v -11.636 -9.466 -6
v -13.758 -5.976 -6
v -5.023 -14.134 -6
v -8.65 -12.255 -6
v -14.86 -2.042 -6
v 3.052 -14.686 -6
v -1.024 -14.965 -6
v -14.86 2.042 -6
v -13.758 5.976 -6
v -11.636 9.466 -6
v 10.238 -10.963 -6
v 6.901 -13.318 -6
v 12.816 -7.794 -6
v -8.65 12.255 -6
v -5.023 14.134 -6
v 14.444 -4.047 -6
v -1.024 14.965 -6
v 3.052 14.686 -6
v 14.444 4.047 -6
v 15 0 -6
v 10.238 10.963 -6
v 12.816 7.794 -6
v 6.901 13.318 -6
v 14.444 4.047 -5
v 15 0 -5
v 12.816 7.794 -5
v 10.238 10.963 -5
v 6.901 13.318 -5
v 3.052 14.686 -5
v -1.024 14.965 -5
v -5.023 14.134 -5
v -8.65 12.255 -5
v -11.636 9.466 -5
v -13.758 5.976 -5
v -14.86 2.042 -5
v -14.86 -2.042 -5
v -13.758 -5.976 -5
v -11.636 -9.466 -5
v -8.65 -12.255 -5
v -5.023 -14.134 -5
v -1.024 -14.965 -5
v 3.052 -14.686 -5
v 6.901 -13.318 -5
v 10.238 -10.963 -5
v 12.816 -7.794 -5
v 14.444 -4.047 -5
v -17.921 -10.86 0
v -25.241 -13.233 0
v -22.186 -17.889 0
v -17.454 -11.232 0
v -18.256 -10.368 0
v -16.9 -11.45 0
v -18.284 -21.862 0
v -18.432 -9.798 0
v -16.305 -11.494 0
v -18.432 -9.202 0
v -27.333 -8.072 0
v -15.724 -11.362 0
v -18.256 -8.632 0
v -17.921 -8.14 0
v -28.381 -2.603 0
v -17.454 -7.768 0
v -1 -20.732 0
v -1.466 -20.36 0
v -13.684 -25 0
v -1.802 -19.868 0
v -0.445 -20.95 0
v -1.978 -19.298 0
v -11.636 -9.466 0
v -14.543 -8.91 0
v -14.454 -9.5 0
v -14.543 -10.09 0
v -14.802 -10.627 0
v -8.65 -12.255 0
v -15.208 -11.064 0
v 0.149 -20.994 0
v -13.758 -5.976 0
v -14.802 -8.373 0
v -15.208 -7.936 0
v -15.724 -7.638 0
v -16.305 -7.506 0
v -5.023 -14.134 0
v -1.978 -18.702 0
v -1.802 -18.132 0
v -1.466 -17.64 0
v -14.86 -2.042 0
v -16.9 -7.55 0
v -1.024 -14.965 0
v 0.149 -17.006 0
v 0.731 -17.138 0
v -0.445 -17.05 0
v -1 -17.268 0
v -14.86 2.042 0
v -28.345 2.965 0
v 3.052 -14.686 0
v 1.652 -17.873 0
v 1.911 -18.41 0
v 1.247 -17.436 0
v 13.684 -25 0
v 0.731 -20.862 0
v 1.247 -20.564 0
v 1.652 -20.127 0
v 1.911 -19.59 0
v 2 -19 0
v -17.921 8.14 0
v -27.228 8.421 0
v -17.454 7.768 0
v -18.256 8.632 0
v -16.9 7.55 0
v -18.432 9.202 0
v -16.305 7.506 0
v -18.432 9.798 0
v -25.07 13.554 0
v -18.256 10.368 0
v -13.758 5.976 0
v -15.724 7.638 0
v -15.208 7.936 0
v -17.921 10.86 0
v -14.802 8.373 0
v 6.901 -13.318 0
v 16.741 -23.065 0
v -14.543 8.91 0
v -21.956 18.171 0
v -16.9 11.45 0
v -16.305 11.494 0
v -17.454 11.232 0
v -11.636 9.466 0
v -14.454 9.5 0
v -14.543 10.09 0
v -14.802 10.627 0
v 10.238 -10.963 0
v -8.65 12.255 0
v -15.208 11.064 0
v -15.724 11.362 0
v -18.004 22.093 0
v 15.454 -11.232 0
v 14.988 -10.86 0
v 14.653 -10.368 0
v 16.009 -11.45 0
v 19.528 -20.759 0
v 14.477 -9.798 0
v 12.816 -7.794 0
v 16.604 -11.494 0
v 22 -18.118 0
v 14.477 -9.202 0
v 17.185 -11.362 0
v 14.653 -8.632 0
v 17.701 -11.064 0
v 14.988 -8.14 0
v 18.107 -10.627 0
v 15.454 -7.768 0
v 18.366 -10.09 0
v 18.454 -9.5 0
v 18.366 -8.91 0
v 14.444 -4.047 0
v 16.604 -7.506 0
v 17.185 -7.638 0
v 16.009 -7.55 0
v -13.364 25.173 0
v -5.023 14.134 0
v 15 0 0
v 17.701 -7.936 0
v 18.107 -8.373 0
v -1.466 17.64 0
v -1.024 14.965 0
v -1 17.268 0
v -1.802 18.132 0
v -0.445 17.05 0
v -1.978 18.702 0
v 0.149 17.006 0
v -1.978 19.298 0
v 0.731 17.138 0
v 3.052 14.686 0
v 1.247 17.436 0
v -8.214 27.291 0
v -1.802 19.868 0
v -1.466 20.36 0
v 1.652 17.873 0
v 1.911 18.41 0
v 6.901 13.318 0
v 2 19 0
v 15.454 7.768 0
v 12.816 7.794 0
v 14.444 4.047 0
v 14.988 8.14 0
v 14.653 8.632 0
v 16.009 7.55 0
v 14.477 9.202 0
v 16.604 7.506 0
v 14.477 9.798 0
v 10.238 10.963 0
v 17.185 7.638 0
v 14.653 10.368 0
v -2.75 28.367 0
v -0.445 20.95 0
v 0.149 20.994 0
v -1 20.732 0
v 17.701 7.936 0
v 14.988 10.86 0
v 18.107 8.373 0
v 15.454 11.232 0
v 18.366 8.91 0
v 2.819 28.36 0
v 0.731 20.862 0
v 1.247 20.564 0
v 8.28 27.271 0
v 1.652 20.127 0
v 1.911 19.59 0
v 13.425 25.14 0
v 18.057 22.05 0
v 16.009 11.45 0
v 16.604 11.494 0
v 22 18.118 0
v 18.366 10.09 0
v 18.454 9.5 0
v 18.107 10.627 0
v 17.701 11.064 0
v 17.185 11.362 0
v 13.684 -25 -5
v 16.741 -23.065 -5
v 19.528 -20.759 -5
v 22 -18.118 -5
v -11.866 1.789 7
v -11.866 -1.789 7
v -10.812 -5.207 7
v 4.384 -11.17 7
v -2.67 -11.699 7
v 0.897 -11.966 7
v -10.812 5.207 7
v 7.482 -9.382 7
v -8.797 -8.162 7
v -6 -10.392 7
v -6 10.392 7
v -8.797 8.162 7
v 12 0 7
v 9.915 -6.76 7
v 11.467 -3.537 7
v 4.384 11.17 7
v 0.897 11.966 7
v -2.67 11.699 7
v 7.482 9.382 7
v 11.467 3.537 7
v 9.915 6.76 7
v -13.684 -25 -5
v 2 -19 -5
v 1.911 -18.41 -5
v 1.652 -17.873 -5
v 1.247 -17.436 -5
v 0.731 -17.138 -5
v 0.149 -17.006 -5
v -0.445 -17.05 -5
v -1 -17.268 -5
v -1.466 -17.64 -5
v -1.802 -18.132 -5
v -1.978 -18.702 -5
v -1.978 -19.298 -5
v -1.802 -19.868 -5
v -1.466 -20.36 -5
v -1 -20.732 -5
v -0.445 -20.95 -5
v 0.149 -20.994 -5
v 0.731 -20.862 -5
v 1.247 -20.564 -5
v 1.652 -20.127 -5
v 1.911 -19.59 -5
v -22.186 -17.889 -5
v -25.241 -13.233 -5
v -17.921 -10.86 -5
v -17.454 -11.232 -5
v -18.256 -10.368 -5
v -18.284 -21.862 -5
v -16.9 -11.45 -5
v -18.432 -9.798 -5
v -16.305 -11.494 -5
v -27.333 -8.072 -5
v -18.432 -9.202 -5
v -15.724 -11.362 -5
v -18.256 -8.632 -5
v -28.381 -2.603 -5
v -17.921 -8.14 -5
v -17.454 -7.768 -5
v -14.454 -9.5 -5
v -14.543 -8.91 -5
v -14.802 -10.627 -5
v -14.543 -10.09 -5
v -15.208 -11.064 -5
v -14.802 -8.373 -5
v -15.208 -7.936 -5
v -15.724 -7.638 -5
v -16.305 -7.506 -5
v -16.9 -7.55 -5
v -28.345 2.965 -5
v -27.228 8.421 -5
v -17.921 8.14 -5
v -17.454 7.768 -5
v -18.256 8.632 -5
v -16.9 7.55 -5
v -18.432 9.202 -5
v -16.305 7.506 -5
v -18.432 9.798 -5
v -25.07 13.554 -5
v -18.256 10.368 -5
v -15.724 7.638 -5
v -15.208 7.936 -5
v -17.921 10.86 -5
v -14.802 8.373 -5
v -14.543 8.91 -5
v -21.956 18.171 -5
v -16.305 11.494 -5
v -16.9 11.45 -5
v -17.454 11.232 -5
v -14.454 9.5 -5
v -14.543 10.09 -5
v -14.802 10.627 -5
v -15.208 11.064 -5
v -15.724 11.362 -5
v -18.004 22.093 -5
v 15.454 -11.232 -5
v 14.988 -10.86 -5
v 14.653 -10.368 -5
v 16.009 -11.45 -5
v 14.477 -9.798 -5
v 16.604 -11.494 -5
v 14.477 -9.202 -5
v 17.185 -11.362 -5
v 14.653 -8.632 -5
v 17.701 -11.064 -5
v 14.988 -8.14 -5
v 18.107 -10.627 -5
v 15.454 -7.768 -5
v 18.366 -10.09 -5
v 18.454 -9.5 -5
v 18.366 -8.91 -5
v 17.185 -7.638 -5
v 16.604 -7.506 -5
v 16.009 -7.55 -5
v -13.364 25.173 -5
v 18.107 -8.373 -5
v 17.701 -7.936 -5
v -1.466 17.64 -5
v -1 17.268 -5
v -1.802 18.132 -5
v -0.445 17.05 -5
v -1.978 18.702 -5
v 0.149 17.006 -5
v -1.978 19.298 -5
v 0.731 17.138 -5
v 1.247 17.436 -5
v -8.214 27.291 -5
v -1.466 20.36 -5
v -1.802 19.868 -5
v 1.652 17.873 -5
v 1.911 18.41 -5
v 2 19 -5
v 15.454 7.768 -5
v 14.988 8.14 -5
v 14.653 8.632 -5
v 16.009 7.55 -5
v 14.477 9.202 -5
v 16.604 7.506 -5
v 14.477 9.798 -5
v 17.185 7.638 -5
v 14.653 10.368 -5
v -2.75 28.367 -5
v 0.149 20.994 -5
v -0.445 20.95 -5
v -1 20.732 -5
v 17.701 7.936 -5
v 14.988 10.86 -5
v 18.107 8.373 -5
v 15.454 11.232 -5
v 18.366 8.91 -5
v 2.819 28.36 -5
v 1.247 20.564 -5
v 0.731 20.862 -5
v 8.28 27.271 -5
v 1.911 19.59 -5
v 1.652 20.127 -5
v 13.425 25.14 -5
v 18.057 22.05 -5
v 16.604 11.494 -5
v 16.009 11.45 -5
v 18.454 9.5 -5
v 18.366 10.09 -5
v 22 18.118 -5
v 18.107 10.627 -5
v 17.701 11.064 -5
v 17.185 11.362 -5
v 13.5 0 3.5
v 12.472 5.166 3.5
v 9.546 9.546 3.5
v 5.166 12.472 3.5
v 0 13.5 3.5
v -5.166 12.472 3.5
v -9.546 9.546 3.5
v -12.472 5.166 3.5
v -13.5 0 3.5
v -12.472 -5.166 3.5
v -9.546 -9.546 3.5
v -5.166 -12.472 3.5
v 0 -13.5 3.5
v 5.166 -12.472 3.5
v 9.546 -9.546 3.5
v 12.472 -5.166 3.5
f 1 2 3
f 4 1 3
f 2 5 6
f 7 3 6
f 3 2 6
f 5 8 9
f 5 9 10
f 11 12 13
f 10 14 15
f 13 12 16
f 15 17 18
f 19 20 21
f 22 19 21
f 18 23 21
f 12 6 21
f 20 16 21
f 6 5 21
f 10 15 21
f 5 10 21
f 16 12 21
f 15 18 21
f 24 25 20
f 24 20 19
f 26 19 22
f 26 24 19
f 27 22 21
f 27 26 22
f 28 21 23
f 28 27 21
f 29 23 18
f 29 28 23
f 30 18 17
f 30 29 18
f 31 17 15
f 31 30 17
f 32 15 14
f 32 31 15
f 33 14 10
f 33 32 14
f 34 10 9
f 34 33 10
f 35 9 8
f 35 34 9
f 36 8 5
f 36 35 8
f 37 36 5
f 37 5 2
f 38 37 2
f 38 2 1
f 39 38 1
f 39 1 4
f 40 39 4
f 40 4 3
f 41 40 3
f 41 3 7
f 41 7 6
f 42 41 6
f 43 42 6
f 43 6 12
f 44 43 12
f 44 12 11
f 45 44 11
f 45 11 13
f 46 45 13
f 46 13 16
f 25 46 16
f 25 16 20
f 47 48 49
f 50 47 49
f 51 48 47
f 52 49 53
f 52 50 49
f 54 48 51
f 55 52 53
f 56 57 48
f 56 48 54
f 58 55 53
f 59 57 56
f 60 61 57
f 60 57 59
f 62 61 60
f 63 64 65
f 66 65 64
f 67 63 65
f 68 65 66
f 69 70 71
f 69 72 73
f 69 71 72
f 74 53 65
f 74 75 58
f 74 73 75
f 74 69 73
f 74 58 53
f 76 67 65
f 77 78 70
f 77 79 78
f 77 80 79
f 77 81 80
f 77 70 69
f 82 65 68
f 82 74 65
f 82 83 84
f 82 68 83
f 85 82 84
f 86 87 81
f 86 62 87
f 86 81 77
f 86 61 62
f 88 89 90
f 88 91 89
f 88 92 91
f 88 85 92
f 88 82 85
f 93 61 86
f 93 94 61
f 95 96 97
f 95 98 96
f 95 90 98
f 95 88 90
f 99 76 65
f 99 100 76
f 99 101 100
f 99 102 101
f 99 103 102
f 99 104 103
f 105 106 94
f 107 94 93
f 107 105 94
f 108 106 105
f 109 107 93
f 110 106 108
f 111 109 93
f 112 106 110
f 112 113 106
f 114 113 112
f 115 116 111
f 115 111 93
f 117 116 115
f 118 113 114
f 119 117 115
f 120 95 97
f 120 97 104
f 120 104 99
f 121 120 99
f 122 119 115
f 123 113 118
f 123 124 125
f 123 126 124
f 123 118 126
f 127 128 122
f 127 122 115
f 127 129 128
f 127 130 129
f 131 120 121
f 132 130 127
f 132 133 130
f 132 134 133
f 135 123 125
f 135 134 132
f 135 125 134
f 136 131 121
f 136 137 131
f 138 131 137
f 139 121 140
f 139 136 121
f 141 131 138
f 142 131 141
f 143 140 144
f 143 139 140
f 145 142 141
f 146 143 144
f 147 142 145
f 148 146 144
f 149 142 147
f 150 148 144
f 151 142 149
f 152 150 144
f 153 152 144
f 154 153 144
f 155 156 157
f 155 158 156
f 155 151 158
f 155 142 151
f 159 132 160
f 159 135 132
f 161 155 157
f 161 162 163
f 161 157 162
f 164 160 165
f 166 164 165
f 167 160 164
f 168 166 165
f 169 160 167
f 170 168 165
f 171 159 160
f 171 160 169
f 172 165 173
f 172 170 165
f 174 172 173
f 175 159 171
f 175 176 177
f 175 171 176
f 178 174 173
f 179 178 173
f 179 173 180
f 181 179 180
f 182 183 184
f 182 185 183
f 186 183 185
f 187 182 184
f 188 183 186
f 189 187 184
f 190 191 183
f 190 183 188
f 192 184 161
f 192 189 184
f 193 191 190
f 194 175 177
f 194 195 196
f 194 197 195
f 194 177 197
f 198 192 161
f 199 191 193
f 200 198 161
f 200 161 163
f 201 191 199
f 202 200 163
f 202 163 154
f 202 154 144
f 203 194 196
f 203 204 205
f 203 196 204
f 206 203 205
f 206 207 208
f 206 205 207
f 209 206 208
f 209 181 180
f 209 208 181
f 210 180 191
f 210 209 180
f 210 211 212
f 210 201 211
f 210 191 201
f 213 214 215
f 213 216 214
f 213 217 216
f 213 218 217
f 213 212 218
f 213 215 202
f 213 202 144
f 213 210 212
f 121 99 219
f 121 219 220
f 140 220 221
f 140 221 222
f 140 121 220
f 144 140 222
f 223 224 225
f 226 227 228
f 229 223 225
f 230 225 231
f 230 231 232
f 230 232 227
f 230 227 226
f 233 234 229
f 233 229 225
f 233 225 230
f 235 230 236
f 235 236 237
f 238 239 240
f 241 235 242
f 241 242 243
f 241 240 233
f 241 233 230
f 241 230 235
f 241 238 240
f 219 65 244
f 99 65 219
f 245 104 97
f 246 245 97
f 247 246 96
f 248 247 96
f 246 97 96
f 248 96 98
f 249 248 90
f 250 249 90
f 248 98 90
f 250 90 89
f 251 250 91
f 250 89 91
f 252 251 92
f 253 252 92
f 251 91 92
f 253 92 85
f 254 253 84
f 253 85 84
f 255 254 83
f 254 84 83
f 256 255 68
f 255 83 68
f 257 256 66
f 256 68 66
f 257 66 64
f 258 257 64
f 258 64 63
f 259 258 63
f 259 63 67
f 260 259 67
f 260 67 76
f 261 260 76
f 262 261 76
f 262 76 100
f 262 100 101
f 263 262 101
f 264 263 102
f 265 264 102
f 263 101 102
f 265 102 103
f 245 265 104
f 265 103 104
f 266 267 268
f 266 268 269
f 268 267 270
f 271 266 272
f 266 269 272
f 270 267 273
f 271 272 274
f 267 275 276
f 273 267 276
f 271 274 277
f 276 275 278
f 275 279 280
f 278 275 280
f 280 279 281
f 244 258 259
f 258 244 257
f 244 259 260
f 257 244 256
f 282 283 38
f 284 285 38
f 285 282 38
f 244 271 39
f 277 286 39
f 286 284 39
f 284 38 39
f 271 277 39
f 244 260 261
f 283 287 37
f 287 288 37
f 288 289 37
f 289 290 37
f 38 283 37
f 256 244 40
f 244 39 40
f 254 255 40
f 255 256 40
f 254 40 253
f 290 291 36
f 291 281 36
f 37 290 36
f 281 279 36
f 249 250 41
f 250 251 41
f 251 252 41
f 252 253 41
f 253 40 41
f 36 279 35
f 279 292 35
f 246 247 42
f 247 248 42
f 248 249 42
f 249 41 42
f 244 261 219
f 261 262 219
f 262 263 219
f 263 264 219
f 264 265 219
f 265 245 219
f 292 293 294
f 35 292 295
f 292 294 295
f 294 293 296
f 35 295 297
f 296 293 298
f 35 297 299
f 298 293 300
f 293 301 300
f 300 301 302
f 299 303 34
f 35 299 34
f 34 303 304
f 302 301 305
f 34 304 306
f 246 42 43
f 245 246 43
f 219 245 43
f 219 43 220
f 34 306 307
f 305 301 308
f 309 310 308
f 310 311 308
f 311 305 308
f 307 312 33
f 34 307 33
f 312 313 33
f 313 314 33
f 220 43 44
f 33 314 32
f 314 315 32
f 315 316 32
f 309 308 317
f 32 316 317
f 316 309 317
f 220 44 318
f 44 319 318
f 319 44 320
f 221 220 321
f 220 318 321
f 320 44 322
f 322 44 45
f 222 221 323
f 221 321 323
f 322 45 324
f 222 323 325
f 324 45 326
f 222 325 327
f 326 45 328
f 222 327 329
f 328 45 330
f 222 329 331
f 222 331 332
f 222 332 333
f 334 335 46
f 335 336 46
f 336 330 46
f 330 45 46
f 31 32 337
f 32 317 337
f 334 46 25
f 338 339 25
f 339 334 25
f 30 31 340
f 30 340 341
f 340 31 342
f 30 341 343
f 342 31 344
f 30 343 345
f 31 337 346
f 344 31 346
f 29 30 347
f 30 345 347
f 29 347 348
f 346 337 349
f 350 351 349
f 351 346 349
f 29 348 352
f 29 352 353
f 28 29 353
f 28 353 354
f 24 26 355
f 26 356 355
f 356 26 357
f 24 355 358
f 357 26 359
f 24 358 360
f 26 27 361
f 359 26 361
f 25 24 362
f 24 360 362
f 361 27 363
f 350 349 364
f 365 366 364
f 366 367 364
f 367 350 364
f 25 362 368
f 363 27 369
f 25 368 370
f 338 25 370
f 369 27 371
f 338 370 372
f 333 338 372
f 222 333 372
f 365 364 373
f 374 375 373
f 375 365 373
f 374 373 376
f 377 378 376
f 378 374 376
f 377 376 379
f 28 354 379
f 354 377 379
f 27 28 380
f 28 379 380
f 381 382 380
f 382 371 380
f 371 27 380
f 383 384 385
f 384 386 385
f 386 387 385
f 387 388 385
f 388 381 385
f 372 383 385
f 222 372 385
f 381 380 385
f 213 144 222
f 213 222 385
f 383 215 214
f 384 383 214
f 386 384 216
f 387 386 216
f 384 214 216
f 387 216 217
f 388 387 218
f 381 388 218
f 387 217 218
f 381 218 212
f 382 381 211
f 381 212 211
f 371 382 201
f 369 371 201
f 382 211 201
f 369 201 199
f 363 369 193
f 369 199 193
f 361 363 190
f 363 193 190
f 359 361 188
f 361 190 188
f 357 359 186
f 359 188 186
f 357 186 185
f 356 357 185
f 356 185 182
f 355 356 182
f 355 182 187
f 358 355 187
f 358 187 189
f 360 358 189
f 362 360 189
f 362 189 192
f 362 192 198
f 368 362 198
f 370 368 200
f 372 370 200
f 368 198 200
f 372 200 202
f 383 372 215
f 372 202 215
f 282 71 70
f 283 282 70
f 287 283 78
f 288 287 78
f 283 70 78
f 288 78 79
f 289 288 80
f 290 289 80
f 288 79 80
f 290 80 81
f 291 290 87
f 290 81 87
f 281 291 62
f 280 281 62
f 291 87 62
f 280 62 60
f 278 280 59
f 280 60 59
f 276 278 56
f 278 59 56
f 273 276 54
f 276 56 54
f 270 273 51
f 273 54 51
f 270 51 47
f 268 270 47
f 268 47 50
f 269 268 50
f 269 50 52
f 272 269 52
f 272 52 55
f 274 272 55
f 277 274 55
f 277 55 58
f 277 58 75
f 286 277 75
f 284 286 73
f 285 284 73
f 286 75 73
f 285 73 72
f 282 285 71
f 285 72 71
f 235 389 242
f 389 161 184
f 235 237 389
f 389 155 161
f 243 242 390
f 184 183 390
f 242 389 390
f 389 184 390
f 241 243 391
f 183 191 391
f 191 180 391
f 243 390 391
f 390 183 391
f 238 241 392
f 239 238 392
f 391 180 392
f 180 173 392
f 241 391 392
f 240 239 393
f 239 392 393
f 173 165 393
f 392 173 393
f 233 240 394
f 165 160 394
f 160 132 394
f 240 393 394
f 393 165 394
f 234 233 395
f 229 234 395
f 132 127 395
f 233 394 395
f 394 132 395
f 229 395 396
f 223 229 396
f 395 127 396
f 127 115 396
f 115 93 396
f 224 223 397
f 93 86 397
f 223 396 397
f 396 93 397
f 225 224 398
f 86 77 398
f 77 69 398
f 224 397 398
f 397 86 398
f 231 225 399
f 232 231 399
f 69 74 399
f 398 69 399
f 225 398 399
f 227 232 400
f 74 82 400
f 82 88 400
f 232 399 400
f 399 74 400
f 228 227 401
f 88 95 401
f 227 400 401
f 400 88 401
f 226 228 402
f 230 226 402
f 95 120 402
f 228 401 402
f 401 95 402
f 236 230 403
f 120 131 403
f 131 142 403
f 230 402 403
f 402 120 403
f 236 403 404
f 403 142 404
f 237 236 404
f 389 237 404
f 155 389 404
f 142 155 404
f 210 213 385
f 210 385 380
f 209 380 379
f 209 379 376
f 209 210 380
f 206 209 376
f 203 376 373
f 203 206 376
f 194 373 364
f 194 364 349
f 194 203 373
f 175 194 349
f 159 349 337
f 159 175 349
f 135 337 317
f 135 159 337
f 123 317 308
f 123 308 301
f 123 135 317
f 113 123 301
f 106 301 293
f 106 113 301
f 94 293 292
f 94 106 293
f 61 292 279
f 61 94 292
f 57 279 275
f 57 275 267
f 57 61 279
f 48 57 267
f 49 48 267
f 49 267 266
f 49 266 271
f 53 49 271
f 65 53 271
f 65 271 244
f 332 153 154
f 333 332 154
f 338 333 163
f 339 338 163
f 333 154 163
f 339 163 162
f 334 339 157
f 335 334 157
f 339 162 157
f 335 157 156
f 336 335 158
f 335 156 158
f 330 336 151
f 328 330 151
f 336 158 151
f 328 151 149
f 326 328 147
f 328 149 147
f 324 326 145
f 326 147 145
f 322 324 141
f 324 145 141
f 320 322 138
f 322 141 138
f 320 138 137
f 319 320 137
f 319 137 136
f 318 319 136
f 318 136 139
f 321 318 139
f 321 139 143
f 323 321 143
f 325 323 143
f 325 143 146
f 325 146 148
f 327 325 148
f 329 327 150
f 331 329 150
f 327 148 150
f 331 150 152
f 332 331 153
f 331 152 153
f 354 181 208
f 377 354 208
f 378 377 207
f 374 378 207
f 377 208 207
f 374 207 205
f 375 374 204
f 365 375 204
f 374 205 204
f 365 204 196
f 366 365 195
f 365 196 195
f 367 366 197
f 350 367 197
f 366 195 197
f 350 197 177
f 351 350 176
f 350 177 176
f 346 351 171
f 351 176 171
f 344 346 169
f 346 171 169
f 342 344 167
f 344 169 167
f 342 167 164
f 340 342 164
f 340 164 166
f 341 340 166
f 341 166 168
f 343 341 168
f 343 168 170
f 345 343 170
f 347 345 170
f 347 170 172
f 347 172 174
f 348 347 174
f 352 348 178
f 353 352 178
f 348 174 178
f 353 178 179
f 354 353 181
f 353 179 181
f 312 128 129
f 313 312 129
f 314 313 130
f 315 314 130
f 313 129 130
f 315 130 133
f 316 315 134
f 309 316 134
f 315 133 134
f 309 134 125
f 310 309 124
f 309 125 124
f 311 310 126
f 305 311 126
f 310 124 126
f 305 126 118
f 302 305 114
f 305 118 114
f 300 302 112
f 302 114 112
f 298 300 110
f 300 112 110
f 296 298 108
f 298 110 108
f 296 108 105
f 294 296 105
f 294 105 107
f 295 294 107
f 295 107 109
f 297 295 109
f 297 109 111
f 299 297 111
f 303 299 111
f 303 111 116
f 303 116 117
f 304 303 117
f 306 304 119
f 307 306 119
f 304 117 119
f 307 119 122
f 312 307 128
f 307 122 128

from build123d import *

# Parameters (mm, degrees)
SKETCH1_R           = 15
SKETCH1_R_2         = 2
BOSS_EXTRUDE1_DEPTH = 5
SKETCH1_2_R         = 15
BOSS_EXTRUDE2_DEPTH = 6
SKETCH2_R           = 12
SKETCH1_4_R         = 15


with BuildPart() as part:
    # Sketch1 → Boss-Extrude1 (new body)
    with BuildSketch(Plane.XY):
        with BuildLine():
            Line((22, -18.117670932), (22, 18.117670932))
            ThreePointArc((22, 18.117670932), (-21.956152501, 18.170783345), (-13.683932183, -25))
            Line((-13.683932183, -25), (13.683932183, -25))
            ThreePointArc((13.683932183, -25), (18.170783345, -21.956152501), (22, -18.117670932))
        make_face()
        Circle(SKETCH1_R, mode=Mode.SUBTRACT)
        with Locations((0, 19)):
            Circle(SKETCH1_R_2, mode=Mode.SUBTRACT)
        with Locations((16.454482672, 9.5)):
            Circle(SKETCH1_R_2, mode=Mode.SUBTRACT)
        with Locations((16.454482672, -9.5)):
            Circle(SKETCH1_R_2, mode=Mode.SUBTRACT)
        with Locations((0, -19)):
            Circle(SKETCH1_R_2, mode=Mode.SUBTRACT)
        with Locations((-16.454482672, -9.5)):
            Circle(SKETCH1_R_2, mode=Mode.SUBTRACT)
        with Locations((-16.454482672, 9.5)):
            Circle(SKETCH1_R_2, mode=Mode.SUBTRACT)
    extrude(amount=-BOSS_EXTRUDE1_DEPTH)

    # Sketch1<2> → Boss-Extrude2 (add)
    with BuildSketch(Plane.XY):
        Circle(SKETCH1_2_R)
    extrude(amount=-BOSS_EXTRUDE2_DEPTH)

    # Sketch2 → Loft1 section 0
    with BuildSketch(Plane.XY.offset(7)):
        Circle(SKETCH2_R)
    # Sketch1<4> → Loft1 section 1
    with BuildSketch(Plane.XY):
        Circle(SKETCH1_4_R)
    loft()


solid = part.part
